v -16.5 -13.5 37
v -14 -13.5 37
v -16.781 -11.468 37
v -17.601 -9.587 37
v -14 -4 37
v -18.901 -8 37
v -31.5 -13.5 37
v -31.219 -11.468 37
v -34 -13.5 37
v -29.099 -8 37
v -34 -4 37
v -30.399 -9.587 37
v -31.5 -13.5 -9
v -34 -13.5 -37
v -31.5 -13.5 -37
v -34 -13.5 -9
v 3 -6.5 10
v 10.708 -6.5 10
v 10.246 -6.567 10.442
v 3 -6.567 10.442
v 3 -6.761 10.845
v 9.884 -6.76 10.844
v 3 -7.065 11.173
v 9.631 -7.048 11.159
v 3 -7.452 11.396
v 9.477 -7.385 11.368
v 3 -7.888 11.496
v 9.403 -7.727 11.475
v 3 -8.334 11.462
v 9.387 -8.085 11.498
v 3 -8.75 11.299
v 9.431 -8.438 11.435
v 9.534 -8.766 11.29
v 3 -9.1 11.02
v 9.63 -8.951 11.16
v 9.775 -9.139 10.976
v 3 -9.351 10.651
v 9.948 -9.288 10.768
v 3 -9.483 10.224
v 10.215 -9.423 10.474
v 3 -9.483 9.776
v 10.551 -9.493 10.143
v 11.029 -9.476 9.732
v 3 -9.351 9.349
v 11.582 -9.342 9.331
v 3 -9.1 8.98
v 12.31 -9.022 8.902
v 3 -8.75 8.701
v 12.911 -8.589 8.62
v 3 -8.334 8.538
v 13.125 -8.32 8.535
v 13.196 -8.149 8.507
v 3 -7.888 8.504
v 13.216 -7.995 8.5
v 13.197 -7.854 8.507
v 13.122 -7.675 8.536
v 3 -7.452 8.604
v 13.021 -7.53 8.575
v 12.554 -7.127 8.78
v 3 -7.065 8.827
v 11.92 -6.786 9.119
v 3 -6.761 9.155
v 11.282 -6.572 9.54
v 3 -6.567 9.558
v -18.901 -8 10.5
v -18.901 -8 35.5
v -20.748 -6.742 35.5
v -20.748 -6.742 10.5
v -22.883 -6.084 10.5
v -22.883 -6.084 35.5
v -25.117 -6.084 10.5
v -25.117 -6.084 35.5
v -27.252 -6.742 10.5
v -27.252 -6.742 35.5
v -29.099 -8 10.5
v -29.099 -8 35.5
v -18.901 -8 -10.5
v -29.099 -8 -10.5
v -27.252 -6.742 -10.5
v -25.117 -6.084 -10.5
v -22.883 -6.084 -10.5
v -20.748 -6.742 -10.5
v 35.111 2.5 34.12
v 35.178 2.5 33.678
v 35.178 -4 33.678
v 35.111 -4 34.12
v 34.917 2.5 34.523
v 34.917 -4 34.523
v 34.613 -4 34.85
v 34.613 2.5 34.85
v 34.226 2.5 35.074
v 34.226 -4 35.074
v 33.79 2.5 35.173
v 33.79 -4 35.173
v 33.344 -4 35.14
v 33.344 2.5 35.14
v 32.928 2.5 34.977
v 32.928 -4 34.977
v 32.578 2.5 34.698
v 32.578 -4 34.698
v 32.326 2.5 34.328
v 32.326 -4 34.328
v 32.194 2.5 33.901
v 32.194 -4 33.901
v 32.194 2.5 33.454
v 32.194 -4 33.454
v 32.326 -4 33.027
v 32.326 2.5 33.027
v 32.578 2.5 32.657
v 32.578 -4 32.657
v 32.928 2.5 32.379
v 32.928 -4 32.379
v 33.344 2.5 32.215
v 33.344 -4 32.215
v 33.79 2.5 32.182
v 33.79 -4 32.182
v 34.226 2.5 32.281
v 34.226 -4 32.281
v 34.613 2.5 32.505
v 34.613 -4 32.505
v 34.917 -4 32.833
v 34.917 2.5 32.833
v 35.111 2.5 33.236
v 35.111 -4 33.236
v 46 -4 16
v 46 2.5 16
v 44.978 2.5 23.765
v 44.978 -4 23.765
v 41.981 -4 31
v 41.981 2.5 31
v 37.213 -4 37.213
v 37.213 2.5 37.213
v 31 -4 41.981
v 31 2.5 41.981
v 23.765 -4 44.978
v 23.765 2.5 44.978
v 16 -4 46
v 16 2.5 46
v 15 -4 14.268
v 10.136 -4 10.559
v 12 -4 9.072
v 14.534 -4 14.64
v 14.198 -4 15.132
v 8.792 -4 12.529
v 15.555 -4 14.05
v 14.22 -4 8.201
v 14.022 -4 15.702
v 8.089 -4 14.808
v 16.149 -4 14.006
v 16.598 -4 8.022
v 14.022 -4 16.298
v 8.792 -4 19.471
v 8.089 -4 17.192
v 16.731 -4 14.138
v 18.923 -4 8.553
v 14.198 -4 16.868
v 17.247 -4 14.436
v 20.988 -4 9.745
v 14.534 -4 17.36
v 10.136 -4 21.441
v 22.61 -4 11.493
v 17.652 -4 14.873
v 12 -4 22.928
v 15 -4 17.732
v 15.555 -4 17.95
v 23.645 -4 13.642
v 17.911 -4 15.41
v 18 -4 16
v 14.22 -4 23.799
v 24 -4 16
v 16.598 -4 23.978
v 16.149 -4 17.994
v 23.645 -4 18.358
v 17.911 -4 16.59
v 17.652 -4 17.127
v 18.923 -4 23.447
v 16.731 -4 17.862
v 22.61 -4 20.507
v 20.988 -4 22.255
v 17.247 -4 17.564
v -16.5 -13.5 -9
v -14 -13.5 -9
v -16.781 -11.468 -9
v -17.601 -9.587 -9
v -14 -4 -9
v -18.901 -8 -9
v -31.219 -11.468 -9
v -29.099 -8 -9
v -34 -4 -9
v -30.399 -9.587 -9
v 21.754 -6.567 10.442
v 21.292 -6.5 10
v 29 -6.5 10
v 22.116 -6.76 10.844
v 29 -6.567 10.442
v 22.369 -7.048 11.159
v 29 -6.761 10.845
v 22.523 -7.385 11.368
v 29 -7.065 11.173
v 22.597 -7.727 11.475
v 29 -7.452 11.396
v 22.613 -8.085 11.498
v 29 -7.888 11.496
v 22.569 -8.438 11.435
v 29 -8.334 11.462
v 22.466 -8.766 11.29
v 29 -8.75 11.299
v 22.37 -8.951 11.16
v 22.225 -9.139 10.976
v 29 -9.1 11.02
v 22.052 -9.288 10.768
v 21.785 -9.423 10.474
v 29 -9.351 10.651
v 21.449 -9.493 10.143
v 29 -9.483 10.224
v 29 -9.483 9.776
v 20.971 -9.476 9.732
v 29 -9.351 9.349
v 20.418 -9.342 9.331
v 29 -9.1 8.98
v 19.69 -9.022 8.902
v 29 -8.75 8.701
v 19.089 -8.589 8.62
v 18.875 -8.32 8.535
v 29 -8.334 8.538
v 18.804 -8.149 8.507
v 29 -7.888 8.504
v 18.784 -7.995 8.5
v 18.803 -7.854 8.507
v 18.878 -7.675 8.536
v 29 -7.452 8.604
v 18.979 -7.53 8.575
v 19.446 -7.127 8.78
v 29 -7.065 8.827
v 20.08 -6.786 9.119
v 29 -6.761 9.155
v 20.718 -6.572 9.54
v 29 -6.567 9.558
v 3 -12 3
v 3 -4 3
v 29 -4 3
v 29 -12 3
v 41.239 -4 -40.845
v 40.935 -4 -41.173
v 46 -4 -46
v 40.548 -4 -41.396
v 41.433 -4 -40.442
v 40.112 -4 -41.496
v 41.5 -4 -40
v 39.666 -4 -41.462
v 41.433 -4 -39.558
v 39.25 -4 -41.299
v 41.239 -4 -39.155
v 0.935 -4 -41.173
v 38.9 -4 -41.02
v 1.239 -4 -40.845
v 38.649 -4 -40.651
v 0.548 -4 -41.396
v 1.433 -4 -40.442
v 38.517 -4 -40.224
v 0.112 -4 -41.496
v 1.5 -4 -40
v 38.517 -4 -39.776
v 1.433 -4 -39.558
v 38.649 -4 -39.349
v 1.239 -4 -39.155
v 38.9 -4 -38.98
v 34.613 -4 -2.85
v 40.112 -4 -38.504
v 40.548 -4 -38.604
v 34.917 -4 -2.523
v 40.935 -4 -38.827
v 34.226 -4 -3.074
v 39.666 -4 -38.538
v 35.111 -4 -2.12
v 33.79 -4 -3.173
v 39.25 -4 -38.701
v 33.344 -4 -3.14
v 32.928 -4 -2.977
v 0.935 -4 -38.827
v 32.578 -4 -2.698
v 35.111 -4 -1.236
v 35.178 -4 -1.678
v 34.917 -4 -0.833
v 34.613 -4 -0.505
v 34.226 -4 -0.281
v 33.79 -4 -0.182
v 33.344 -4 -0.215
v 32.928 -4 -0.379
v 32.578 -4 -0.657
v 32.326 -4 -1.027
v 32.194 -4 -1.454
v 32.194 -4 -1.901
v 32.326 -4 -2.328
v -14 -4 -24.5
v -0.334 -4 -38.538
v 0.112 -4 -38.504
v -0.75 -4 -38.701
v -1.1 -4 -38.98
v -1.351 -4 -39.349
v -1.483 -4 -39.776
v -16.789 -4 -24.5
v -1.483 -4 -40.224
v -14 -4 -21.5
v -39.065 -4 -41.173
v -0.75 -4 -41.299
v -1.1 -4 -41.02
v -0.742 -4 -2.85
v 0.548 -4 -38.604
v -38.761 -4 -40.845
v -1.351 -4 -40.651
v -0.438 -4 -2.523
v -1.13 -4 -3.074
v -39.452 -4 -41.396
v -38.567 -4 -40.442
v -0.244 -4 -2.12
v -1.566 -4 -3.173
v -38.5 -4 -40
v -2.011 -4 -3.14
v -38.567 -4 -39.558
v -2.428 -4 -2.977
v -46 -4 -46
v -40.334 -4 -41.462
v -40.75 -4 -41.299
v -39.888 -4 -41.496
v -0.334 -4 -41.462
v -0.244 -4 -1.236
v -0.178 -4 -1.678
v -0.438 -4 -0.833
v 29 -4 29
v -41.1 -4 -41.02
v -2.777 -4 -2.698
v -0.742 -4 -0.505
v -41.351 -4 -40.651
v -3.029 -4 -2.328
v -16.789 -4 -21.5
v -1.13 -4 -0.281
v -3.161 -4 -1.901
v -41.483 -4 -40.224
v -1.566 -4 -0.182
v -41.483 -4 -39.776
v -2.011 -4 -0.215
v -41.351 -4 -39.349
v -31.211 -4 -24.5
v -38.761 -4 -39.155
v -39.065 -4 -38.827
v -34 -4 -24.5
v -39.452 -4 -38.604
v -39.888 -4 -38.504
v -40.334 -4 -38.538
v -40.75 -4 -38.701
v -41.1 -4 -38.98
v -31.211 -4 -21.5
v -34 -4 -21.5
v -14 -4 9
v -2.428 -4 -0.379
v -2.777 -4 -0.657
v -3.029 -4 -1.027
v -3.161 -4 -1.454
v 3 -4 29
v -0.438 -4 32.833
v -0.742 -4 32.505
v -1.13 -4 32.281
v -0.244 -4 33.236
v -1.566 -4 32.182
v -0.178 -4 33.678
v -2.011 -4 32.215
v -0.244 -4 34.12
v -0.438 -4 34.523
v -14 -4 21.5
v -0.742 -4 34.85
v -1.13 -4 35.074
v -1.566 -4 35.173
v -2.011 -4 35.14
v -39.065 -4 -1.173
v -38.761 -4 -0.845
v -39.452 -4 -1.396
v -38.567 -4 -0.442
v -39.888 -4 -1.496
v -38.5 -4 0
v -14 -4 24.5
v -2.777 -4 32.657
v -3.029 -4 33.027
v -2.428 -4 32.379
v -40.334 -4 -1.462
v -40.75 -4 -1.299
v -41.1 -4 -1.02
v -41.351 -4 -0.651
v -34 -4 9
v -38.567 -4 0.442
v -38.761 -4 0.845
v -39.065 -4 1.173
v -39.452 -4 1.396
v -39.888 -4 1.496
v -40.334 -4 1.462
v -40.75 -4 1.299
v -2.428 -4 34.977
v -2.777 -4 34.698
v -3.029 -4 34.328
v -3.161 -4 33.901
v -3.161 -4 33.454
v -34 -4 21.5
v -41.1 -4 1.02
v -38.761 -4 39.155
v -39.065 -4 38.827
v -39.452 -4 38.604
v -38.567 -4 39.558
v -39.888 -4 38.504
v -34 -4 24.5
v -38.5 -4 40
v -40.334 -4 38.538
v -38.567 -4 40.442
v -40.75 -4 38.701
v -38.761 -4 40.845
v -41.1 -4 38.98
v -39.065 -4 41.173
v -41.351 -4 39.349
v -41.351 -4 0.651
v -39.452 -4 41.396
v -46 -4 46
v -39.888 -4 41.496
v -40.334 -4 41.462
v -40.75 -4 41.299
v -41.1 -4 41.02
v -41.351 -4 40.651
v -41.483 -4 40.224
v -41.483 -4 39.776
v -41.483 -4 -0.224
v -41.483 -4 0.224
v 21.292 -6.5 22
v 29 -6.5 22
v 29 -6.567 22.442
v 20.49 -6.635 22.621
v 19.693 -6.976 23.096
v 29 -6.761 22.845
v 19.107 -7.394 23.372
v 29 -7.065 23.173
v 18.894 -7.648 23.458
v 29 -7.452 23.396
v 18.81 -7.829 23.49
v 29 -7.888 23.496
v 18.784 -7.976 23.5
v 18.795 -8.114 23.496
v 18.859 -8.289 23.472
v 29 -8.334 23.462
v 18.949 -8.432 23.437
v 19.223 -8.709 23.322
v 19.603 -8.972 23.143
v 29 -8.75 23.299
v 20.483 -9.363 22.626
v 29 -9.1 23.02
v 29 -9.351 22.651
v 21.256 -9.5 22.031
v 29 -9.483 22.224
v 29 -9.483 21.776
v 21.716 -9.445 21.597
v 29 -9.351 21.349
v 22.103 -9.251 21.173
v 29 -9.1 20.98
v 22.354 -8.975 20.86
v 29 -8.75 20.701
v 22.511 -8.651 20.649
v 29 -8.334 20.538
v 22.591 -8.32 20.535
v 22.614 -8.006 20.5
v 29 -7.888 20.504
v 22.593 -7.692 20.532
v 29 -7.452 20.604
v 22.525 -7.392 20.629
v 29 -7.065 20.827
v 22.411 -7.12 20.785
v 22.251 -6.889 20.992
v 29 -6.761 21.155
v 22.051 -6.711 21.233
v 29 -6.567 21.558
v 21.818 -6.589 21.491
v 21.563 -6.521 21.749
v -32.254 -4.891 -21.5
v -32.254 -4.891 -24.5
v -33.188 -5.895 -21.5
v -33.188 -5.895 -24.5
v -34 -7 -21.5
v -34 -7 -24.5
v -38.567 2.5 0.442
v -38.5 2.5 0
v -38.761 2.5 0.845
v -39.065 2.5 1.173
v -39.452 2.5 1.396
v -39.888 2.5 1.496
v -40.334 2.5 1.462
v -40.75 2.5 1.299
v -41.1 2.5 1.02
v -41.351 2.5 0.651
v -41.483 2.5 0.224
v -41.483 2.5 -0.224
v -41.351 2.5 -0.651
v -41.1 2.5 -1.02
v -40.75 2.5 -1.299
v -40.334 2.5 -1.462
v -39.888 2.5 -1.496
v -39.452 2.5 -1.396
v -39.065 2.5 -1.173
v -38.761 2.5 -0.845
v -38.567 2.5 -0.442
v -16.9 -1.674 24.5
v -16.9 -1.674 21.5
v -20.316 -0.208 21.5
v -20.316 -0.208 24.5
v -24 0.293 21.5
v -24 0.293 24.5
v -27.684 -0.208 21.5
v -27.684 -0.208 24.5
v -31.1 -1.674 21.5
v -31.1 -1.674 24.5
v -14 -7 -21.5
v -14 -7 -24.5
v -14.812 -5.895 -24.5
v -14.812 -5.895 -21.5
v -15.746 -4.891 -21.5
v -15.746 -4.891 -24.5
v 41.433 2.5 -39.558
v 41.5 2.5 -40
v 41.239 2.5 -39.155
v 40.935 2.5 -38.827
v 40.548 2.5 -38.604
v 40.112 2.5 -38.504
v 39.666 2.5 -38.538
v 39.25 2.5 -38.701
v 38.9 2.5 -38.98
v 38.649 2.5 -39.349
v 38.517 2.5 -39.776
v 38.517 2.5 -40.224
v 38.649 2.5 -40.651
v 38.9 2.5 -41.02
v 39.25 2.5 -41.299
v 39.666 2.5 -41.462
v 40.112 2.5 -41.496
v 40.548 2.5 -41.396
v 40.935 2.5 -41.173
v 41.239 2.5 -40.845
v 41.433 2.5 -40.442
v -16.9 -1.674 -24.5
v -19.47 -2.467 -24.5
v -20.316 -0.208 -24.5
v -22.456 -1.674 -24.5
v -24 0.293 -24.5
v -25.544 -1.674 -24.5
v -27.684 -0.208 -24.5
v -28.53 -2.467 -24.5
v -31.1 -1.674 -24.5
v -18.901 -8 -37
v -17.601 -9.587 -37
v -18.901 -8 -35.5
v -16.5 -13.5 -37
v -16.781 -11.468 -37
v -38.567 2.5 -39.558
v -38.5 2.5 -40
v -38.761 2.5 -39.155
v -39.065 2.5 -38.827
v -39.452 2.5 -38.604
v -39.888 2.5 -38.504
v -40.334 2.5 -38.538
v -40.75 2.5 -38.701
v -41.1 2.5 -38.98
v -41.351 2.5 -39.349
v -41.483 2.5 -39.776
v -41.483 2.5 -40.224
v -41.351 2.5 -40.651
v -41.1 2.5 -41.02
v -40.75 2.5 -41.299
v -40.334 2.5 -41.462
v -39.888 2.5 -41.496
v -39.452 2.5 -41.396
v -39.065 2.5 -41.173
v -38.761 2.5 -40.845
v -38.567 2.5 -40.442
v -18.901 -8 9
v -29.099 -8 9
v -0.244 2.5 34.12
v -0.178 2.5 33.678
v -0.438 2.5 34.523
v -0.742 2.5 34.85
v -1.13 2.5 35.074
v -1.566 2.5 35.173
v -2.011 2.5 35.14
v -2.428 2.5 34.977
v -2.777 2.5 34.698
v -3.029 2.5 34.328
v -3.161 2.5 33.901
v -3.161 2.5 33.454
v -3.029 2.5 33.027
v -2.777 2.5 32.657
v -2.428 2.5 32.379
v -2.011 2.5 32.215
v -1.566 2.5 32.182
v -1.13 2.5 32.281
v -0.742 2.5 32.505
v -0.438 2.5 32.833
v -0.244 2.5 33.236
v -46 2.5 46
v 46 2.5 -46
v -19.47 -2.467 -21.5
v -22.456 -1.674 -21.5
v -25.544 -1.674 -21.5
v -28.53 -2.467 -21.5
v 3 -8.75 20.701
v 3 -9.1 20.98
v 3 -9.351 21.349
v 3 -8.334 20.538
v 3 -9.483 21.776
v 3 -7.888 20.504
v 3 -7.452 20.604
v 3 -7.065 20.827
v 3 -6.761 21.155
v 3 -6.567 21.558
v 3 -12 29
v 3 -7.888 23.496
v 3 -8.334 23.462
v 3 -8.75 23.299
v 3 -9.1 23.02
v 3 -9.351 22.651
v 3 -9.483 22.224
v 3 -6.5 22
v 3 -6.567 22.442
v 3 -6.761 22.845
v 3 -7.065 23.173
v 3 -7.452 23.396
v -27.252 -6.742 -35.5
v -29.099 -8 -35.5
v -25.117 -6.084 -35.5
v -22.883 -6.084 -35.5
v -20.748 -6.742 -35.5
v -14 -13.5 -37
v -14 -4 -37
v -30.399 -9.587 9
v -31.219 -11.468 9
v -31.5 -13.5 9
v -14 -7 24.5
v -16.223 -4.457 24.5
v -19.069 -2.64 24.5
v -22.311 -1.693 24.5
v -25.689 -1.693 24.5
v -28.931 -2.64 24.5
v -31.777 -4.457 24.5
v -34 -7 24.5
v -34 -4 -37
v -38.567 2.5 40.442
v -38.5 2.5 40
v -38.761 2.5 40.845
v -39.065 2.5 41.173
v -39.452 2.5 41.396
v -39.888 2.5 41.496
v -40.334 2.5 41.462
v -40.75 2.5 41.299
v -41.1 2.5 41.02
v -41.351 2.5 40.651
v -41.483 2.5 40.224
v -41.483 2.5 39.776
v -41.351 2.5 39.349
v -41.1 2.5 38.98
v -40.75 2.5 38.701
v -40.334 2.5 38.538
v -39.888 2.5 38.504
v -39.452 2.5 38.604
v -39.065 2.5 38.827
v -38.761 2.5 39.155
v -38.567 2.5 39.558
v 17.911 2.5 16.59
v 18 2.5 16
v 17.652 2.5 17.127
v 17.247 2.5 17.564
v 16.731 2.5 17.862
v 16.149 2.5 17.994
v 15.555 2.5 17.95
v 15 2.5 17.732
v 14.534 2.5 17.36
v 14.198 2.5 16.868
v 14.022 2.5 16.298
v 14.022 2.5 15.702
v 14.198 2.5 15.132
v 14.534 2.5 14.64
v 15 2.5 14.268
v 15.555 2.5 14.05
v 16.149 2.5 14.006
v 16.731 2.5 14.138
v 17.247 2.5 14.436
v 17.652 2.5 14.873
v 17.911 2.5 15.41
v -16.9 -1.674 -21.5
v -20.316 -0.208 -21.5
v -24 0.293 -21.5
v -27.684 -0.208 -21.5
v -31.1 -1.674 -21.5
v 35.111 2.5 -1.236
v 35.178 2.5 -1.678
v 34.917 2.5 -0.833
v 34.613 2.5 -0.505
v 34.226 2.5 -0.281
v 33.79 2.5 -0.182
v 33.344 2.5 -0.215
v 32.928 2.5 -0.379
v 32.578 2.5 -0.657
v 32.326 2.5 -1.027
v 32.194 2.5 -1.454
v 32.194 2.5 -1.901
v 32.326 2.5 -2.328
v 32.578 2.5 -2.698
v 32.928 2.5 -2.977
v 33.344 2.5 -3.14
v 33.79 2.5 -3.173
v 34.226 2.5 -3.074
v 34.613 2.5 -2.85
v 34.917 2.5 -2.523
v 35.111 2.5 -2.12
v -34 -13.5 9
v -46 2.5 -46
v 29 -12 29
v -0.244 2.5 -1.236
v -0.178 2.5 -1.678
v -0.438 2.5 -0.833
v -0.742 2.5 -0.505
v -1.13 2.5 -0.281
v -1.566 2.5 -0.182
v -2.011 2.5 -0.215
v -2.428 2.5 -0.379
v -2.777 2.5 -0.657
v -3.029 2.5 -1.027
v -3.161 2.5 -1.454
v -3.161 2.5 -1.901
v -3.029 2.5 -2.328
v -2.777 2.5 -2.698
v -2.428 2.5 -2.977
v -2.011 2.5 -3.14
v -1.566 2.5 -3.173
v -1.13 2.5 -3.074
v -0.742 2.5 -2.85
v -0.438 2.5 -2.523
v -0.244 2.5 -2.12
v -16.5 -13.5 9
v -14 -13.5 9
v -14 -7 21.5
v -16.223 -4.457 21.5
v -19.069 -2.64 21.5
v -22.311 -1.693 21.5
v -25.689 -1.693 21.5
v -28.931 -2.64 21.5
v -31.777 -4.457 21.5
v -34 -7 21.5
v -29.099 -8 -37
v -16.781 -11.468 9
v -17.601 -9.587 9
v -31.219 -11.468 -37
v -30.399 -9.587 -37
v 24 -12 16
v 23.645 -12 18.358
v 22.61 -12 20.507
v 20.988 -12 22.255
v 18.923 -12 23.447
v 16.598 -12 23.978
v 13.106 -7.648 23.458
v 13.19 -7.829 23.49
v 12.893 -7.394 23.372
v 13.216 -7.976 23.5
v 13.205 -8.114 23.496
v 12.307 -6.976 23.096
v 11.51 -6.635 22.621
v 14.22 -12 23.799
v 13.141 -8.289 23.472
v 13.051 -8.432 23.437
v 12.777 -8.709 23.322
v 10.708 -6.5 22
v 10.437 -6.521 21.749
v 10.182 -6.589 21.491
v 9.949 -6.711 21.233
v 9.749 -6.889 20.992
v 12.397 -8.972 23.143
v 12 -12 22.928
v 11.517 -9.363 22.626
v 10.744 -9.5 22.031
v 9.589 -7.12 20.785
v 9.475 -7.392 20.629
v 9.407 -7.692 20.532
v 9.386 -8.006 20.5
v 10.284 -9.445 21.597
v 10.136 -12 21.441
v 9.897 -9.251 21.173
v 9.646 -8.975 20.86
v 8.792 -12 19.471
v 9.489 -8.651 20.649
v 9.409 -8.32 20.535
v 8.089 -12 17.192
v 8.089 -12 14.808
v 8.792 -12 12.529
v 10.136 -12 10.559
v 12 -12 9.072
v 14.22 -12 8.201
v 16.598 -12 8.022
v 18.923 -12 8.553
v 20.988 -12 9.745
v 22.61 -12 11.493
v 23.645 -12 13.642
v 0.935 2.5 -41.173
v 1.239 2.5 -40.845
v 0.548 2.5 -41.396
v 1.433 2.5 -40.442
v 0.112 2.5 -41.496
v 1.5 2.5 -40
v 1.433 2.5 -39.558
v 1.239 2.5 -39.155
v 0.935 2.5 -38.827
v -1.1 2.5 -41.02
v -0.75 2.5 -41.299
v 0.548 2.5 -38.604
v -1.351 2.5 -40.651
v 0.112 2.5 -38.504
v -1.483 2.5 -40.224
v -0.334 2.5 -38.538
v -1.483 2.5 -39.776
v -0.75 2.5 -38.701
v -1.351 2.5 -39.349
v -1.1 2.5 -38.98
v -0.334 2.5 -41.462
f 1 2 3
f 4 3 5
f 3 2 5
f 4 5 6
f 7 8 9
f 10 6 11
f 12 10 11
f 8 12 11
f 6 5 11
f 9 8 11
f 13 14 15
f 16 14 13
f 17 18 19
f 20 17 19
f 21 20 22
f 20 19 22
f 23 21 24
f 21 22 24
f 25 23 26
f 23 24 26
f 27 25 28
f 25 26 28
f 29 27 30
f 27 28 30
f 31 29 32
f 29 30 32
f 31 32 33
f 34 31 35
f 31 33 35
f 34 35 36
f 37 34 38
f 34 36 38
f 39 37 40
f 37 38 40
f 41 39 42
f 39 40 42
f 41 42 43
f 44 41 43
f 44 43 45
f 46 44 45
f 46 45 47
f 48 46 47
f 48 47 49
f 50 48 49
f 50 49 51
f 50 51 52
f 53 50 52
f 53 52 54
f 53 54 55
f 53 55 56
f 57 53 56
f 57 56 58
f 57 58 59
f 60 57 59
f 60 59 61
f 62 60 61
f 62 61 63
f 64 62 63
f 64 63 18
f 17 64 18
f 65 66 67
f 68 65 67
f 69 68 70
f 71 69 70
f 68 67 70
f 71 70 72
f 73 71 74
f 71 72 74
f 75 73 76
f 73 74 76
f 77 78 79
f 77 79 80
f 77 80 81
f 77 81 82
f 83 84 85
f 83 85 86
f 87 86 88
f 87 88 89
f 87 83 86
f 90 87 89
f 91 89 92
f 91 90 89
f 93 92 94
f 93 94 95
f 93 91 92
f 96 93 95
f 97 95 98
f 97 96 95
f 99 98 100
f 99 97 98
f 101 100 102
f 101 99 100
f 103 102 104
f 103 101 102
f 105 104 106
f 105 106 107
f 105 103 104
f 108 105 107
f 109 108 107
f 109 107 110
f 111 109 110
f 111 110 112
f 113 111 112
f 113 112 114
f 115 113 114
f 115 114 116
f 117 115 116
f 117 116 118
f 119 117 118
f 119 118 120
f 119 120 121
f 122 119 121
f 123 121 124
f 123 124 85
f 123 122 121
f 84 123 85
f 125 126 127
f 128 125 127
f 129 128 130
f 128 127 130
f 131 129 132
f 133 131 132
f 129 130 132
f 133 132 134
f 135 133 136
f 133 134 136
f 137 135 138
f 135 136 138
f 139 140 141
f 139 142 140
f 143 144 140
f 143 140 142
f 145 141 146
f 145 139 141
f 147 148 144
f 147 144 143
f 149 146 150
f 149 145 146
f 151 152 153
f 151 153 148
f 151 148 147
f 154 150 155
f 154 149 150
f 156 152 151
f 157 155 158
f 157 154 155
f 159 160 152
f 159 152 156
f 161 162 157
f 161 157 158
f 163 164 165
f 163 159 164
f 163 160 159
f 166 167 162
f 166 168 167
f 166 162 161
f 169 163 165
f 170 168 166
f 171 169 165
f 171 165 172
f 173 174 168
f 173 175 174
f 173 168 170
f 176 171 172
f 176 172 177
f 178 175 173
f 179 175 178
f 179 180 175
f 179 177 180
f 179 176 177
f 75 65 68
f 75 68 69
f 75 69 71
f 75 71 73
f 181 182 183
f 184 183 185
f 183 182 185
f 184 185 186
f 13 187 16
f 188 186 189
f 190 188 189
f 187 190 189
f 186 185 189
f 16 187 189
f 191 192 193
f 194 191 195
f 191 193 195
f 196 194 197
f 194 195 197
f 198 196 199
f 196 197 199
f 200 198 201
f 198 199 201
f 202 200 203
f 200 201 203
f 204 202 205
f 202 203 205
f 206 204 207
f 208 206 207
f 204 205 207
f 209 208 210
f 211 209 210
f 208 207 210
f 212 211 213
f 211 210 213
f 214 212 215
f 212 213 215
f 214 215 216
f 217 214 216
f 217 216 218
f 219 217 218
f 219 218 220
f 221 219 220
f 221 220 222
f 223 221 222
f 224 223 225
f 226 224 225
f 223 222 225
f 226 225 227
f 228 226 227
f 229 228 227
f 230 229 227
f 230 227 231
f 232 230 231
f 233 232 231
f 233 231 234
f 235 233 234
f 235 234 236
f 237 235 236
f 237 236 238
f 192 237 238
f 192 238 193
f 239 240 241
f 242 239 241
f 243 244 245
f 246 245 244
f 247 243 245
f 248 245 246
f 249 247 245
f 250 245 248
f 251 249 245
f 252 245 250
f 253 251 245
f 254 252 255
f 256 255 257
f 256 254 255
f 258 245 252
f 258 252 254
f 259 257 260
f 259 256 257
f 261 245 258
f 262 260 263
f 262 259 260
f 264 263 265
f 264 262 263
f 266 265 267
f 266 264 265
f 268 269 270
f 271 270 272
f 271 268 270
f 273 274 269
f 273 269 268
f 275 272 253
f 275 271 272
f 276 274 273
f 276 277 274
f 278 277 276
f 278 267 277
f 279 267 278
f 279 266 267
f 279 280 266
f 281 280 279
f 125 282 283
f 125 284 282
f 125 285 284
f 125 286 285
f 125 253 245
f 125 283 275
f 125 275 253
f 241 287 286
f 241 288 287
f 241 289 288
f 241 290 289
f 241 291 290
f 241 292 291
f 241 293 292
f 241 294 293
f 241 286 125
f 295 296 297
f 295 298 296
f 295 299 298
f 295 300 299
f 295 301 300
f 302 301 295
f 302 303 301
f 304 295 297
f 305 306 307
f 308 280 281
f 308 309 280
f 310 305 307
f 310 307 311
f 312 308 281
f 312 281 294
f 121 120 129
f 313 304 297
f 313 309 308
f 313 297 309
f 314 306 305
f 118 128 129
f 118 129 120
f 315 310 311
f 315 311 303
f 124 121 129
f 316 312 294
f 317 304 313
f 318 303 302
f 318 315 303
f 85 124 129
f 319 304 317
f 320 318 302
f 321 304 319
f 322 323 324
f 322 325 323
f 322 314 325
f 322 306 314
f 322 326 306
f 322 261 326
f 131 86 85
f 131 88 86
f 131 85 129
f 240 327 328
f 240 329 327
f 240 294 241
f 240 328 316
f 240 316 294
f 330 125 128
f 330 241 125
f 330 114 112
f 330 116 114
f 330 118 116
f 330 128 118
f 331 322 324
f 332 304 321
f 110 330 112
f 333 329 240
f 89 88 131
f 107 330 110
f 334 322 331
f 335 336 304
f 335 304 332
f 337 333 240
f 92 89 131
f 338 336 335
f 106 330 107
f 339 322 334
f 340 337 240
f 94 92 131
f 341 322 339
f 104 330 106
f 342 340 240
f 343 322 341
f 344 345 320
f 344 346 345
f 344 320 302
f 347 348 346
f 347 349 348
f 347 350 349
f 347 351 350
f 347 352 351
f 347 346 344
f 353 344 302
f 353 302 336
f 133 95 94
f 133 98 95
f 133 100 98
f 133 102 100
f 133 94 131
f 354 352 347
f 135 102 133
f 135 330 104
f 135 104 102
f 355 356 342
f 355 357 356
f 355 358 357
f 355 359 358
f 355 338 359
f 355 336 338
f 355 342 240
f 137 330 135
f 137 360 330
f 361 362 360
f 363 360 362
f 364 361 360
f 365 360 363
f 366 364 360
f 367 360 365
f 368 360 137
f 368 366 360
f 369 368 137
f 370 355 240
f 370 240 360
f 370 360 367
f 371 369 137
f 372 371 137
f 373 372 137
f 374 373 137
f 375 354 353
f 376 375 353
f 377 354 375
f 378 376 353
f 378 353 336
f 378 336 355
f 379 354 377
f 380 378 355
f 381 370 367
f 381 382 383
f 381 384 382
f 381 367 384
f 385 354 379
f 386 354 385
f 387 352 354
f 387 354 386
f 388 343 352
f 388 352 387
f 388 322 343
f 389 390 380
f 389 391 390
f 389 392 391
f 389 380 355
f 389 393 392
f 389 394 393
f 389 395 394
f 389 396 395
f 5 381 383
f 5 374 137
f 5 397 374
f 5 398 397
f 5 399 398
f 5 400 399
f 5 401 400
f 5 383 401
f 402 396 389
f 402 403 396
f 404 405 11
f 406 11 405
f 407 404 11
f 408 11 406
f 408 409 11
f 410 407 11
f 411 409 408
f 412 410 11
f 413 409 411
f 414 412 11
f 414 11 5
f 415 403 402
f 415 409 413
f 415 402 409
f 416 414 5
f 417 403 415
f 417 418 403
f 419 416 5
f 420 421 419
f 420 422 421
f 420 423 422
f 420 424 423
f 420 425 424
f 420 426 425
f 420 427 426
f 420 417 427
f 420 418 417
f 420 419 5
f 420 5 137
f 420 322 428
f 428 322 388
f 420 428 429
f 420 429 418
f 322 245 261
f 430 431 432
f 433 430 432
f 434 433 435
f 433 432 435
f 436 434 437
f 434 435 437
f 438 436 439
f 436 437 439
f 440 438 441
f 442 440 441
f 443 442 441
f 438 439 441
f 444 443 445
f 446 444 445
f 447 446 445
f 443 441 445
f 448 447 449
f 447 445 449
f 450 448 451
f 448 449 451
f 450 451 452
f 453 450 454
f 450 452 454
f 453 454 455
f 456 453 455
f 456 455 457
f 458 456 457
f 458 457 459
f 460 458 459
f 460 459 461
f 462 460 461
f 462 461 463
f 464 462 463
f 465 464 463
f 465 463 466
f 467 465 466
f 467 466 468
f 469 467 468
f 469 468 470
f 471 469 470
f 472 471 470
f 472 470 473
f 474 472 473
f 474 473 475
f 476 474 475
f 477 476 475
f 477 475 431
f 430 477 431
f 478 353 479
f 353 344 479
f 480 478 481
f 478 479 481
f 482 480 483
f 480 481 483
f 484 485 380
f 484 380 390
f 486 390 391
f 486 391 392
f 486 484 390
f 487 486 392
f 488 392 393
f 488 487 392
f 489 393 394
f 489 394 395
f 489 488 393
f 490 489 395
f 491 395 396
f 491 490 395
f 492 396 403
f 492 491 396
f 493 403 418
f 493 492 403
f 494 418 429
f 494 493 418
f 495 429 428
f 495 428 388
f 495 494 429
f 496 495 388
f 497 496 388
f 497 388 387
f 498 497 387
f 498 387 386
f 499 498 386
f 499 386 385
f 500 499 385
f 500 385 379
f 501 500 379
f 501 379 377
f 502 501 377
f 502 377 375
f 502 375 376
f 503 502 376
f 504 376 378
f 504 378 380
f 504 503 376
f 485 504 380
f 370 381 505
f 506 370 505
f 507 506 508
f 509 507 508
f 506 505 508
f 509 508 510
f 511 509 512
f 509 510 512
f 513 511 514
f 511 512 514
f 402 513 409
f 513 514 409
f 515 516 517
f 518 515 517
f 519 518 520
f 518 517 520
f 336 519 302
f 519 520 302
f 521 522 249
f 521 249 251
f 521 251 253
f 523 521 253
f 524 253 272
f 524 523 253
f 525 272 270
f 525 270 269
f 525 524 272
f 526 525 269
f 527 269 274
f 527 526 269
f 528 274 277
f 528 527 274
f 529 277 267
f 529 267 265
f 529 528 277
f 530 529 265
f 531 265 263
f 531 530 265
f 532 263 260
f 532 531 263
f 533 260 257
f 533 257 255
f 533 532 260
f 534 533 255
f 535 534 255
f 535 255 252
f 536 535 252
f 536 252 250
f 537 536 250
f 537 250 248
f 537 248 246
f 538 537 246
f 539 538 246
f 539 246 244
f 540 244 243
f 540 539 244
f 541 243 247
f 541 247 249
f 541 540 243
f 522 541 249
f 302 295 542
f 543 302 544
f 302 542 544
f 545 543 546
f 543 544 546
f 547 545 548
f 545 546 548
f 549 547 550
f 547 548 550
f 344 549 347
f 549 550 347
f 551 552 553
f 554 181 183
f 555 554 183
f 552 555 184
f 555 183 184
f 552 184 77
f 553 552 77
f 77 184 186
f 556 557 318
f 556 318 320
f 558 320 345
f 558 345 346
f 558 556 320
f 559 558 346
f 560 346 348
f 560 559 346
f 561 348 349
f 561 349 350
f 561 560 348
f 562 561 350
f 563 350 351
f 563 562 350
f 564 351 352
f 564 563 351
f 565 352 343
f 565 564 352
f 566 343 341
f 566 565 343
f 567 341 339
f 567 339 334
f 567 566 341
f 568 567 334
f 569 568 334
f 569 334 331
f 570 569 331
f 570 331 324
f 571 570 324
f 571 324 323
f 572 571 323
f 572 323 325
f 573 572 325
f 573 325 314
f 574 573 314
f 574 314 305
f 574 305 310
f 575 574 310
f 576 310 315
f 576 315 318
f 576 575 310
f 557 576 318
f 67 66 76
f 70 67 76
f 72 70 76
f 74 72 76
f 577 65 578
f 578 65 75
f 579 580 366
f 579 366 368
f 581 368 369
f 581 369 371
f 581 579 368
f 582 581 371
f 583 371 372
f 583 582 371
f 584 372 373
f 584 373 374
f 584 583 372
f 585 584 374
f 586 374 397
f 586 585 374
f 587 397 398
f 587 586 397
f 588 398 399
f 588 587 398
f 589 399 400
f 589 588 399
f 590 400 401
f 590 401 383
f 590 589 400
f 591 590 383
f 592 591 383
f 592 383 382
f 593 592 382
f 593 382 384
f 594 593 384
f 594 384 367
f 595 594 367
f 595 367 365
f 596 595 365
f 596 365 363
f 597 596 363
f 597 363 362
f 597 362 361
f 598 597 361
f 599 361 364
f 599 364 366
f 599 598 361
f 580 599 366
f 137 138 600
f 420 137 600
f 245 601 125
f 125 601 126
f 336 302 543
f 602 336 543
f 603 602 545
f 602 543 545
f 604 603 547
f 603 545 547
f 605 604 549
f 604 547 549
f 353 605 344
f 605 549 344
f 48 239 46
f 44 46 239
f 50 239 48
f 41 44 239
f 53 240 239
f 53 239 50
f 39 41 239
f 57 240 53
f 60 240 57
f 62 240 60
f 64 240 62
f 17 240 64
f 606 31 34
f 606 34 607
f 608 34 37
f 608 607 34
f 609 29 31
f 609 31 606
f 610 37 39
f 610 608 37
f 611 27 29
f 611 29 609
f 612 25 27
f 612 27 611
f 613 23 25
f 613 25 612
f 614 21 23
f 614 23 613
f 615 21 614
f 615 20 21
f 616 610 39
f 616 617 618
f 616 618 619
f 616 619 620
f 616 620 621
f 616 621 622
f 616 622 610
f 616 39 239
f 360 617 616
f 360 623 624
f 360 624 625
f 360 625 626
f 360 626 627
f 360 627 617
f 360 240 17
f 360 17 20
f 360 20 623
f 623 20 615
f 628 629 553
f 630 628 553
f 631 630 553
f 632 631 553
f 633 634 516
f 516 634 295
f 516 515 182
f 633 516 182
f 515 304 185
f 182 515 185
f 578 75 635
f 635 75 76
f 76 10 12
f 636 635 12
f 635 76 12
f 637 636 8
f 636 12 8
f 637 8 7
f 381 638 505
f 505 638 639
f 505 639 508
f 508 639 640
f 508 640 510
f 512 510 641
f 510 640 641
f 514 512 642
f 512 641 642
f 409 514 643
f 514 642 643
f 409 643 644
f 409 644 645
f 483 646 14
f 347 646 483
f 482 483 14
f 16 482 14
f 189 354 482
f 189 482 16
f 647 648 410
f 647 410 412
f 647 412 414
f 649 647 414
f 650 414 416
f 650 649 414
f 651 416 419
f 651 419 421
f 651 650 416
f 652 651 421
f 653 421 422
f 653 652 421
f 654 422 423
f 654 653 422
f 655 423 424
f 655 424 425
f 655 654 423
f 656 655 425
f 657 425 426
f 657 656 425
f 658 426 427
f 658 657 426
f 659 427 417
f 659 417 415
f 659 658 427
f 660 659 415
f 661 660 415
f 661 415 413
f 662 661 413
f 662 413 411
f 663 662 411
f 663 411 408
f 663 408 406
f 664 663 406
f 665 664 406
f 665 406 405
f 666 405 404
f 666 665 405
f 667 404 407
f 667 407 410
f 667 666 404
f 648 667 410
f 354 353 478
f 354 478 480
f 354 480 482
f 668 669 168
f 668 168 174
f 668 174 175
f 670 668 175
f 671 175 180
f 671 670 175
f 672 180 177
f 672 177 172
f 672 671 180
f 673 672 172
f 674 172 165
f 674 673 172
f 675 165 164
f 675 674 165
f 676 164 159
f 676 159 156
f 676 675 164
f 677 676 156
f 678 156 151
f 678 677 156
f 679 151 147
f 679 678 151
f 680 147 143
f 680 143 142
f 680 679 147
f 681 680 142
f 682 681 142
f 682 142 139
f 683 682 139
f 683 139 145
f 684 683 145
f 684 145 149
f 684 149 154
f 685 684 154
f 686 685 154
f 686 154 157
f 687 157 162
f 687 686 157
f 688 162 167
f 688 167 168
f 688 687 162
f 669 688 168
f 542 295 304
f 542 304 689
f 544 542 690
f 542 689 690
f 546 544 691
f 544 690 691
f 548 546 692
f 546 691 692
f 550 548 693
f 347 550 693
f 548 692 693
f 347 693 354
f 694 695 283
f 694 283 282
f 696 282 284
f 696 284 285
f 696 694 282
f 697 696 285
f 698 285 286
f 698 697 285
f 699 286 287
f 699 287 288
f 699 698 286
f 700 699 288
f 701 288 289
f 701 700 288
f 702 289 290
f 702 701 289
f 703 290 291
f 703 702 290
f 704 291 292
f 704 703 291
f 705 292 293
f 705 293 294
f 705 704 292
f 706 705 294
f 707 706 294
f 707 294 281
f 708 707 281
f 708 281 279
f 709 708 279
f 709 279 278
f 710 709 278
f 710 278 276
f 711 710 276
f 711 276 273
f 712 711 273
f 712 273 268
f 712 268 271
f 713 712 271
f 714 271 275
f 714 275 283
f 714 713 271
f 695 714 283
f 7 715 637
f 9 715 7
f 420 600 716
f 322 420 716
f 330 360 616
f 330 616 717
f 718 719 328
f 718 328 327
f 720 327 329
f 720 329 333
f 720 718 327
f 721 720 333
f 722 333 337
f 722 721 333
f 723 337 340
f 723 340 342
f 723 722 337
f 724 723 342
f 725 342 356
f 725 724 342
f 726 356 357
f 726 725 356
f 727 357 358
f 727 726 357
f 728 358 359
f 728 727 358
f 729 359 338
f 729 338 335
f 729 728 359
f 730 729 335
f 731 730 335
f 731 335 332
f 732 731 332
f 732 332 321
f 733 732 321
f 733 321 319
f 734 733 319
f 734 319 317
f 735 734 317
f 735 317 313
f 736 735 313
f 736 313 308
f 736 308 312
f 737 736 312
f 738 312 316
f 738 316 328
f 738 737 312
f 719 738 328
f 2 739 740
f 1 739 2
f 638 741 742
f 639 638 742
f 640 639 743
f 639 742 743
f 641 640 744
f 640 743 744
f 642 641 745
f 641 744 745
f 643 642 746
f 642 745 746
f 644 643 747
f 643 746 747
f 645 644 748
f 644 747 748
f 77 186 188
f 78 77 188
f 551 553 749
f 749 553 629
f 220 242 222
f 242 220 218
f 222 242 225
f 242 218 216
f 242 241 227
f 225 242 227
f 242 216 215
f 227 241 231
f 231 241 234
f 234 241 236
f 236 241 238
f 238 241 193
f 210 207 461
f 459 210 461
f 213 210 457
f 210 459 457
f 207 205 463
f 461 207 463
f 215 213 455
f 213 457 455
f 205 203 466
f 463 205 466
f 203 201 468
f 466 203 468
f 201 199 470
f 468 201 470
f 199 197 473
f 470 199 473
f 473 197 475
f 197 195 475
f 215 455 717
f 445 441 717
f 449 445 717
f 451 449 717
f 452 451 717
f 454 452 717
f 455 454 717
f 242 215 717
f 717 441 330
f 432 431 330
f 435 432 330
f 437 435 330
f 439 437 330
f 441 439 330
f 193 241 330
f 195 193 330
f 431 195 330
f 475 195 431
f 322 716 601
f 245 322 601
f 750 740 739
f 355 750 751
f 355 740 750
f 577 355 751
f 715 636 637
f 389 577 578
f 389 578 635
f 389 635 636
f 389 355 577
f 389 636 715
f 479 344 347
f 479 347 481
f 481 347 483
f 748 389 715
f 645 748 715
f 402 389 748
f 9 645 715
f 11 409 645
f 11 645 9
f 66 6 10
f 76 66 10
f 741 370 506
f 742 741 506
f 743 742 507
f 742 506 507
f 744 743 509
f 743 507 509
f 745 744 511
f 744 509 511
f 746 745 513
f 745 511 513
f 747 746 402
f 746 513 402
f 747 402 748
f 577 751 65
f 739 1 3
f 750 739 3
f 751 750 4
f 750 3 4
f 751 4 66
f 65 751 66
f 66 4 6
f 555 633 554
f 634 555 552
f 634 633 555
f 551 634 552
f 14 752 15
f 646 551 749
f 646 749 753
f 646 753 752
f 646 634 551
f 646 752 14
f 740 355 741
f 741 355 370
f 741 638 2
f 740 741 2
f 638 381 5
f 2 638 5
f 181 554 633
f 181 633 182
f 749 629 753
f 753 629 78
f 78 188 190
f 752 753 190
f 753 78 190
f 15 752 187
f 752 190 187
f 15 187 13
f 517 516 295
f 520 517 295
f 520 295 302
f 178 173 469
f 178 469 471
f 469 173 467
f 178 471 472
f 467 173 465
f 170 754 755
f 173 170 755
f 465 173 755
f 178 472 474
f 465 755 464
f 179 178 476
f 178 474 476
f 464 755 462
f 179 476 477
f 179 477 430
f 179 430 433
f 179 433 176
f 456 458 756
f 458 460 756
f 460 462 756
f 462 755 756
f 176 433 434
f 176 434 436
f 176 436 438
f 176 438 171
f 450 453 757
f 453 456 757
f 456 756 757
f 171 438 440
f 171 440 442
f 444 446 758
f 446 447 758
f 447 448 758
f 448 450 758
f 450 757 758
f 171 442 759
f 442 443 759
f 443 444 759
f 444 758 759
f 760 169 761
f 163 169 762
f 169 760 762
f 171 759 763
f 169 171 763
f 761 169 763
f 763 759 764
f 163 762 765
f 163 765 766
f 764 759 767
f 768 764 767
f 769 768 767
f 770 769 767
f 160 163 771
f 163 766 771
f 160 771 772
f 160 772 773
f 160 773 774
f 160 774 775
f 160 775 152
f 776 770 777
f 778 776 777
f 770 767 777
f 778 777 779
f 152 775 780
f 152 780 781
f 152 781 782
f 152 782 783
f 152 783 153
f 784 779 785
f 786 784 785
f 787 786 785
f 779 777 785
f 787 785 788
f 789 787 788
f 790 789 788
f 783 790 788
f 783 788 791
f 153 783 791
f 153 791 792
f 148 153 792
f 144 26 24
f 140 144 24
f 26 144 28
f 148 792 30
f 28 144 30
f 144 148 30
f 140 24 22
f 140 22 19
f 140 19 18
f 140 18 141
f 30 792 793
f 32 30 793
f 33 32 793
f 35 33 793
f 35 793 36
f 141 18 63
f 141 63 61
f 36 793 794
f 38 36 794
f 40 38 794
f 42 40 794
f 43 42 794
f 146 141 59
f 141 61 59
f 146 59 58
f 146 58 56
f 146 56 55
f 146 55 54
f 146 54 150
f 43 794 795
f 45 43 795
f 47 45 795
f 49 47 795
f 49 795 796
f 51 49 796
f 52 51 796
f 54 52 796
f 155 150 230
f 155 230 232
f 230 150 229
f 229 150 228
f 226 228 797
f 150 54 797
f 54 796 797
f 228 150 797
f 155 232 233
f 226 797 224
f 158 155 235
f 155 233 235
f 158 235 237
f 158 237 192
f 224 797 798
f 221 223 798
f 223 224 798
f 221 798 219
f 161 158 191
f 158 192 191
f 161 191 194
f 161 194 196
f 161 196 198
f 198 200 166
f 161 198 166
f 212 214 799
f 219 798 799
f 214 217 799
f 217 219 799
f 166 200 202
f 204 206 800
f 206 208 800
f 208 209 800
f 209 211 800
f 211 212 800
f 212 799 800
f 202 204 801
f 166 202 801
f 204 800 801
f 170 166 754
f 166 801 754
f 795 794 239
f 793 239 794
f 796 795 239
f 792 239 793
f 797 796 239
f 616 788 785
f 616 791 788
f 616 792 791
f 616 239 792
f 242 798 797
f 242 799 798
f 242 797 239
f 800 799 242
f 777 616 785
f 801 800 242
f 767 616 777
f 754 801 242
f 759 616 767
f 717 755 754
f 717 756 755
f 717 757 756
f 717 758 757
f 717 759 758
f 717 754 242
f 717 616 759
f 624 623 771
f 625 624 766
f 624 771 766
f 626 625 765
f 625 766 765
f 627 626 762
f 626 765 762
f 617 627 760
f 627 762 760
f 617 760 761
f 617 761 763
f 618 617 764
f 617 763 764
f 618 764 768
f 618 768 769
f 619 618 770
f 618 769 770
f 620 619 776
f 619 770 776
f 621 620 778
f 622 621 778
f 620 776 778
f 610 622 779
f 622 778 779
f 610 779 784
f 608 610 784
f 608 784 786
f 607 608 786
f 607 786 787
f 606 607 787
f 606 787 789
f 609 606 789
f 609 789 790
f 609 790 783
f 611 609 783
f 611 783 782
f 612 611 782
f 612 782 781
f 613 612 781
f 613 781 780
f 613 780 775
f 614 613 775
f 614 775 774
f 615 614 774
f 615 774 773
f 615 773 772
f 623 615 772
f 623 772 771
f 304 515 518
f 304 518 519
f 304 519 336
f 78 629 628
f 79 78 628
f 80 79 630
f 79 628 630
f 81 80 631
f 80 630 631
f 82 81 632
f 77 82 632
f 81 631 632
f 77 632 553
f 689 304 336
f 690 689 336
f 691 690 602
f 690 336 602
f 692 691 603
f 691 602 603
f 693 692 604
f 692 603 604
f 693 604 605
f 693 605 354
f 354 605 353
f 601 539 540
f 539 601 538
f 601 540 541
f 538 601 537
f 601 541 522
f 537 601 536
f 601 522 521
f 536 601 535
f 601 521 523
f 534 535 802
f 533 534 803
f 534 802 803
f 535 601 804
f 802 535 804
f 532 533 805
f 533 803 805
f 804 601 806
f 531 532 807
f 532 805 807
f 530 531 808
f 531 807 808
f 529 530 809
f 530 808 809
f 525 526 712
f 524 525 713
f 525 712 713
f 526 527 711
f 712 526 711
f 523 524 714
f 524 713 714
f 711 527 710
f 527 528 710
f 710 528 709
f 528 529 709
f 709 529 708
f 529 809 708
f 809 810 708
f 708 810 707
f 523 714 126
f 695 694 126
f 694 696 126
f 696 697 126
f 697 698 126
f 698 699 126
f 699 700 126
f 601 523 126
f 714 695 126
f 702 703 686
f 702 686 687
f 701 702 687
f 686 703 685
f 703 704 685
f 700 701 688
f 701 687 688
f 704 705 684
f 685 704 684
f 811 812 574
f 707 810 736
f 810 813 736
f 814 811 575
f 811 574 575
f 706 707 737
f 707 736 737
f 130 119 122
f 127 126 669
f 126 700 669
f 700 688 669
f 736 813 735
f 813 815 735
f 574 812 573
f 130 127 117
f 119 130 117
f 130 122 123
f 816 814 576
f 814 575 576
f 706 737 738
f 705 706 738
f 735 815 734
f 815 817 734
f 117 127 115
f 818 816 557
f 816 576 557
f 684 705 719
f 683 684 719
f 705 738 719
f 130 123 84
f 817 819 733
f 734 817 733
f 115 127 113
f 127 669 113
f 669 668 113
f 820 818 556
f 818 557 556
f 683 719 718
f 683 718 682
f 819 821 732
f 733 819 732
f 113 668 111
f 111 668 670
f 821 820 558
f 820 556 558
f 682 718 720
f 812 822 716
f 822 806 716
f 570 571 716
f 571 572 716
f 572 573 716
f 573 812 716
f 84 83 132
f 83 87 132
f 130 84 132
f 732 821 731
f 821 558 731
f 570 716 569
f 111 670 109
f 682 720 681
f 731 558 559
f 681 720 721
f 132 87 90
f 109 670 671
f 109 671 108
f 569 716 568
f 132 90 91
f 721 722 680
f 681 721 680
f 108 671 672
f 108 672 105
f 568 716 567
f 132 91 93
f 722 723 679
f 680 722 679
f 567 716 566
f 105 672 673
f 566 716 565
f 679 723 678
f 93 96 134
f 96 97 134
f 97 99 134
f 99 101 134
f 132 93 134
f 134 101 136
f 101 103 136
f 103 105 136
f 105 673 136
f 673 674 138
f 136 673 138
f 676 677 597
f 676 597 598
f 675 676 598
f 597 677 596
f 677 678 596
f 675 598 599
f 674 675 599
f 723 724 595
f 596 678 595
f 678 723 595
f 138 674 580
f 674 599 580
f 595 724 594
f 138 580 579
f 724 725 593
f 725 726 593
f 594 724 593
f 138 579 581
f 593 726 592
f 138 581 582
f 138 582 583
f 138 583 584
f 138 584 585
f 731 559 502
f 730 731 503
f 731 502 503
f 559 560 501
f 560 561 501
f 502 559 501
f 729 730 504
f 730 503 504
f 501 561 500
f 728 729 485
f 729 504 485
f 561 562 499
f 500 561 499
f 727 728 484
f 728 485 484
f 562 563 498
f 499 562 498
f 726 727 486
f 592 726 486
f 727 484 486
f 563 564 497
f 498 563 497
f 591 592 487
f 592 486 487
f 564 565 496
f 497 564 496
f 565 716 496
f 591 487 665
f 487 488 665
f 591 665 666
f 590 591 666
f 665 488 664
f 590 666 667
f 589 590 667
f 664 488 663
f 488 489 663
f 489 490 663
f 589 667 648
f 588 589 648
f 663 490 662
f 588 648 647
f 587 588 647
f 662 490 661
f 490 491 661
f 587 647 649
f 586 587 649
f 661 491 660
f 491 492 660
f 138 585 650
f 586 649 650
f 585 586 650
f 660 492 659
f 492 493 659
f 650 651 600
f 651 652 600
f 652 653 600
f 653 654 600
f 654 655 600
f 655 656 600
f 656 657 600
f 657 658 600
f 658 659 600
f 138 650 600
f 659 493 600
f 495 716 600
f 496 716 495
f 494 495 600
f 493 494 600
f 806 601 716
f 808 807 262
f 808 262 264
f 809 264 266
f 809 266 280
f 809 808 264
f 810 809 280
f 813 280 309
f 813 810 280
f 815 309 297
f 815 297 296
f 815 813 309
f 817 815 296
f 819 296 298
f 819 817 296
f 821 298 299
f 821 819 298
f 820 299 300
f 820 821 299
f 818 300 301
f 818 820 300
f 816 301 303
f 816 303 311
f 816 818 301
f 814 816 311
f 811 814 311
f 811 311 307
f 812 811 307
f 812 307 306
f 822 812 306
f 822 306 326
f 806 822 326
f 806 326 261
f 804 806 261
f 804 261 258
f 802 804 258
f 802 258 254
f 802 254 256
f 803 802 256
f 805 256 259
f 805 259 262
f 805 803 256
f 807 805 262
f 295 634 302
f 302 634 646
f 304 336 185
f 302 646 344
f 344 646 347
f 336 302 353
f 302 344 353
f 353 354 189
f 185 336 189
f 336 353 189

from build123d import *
from build123d.topology import SkipClean

# Parameters (mm, degrees)
EXTRUDE2_DEPTH          = 4
EXTRUDE2_DEPTH_BACK     = 2.5
SKETCH7_R               = 1.5
SKETCH7_R_2             = 2
SKETCH8_W               = 28
SKETCH8_H               = 20
EXTRUDE3_DEPTH          = 9.5
EXTRUDE6_DEPTH          = 28
SKETCH15_R              = 7.5
EXTRUDE7_DEPTH          = 25
SKETCH16_W              = 3
SKETCH16_H              = 3
SKETCH8_4_W             = 28
SKETCH8_4_H             = 20
EXTRUDE8_DEPTH          = 9.5
EXTRUDE9_DEPTH          = 28
SKETCH19_R              = 7.5
EXTRUDE10_DEPTH         = 25
SKETCH20_W              = 3
SKETCH20_H              = 3
BODY_MOVE_COPY1_ANGLE   = 180
BODY_MOVE_COPY1_2_ANGLE = 180
SKETCH22_W              = 26
SKETCH22_H              = 26
EXTRUDE11_DEPTH         = 8
SKETCH23_R              = 1.5
EXTRUDE12_DEPTH         = 26
SKETCH24_R              = 8
EXTRUDE13_DEPTH         = 8


with BuildPart() as part:
    # Sketch7 → Extrude2 (new, two sides: drawn at the far end of the back side and taken through both)
    with BuildSketch(Plane(origin=(0, 0, 0), x_dir=(1, 0, 0), z_dir=(0, 1, 0)).offset(-EXTRUDE2_DEPTH_BACK)):
        with BuildLine():
            Line((-46, -46), (16, -46))
            ThreePointArc((16, -46), (37.213203436, -37.213203436), (46, -16))
            Line((46, -16), (46, 46))
            Line((46, 46), (-46, 46))
            Line((-46, 46), (-46, -46))
        make_face()
        with Locations(Location((-1.67766953, 1.67766953, 0), (0, 0, 270))):
            Circle(SKETCH7_R, mode=Mode.SUBTRACT)
        with Locations(Location((-40, 40, 0), (0, 0, 270))):
            Circle(SKETCH7_R, mode=Mode.SUBTRACT)
        with Locations(Location((-40, -40, 0), (0, 0, 270))):
            Circle(SKETCH7_R, mode=Mode.SUBTRACT)
        with Locations(Location((40, 40, 0), (0, 0, 270))):
            Circle(SKETCH7_R, mode=Mode.SUBTRACT)
        with Locations(Location((0, 40, 0), (0, 0, 270))):
            Circle(SKETCH7_R, mode=Mode.SUBTRACT)
        with Locations(Location((-40, 0, 0), (0, 0, 270))):
            Circle(SKETCH7_R, mode=Mode.SUBTRACT)
        with Locations(Location((16, -16, 0), (0, 0, 270))):
            Circle(SKETCH7_R_2, mode=Mode.SUBTRACT)
        with Locations(Location((33.67766953, 1.67766953, 0), (0, 0, 270))):
            Circle(SKETCH7_R, mode=Mode.SUBTRACT)
        with Locations(Location((33.67766953, -33.67766953, 0), (0, 0, 270))):
            Circle(SKETCH7_R, mode=Mode.SUBTRACT)
        with Locations(Location((-1.67766953, -33.67766953, 0), (0, 0, 270))):
            Circle(SKETCH7_R, mode=Mode.SUBTRACT)
    extrude(amount=EXTRUDE2_DEPTH + EXTRUDE2_DEPTH_BACK)


with BuildPart() as body_2:
    # Sketch8 → Extrude3 (new body)
    with BuildSketch(Plane(origin=(0, 4, 0), x_dir=(1, 0, 0), z_dir=(0, 1, 0))):
        with Locations((-23, 24)):
            Rectangle(SKETCH8_W, SKETCH8_H)
    extrude(amount=EXTRUDE3_DEPTH)

    # Sketch10 → Extrude6 (cut)
    with BuildSketch(Plane(origin=(-9, 0, 0), x_dir=(0, 0, -1), z_dir=(1, 0, 0))):
        with BuildLine():
            Line((31.5, 13.5), (24, 13.5))
            Line((24, 13.5), (16.5, 13.5))
            ThreePointArc((16.5, 13.5), (17.126403912, 10.499387259), (18.900980486, 8))
            Line((18.900980486, 8), (29.099019514, 8))
            ThreePointArc((29.099019514, 8), (30.873596088, 10.499387259), (31.5, 13.5))
        make_face()
    extrude(amount=-EXTRUDE6_DEPTH, mode=Mode.SUBTRACT)

    # Sketch15 → Extrude7 (cut)
    with SkipClean():  # the faces are left unmerged after this step: merging them gives an invalid solid
        with BuildSketch(Plane.ZY.offset(35.5)):
            with Locations((-24, 13.5)):
                Circle(SKETCH15_R)
        extrude(amount=-EXTRUDE7_DEPTH, mode=Mode.SUBTRACT)


with BuildPart() as cut_sweep1_tool:
    # Cut-Sweep1: sweep along a path in Sketch17
    with SkipClean():  # the faces are left unmerged after this step: merging them gives an invalid solid
        with BuildLine(Plane(origin=(-23, 0, 0), x_dir=(0, 0, -1), z_dir=(1, 0, 0))) as cut_sweep1_path:
            CenterArc((24, 13.5), 12.806248475, 0, 360)
        # Sketch16 → Cut-Sweep1 (sweep)
        with BuildSketch(Plane.XY.offset(-14)):
            with Locations((-23, 5.5)):
                Rectangle(SKETCH16_W, SKETCH16_H)
        sweep(path=cut_sweep1_path.line)


with BuildPart() as part_1:
    with SkipClean():  # the faces are left unmerged after this step: merging them gives an invalid solid
        add(part.part)

        # Cut-Sweep1: cut by cut_sweep1_tool
        add(cut_sweep1_tool.part, mode=Mode.SUBTRACT)

    # Sketch8<4> → Extrude8 (add)
    with BuildSketch(Plane(origin=(0, 4, 0), x_dir=(1, 0, 0), z_dir=(0, 1, 0))):
        with Locations((23, 24)):
            Rectangle(SKETCH8_4_W, SKETCH8_4_H)
    extrude(amount=EXTRUDE8_DEPTH)

    # Sketch18 → Extrude9 (cut)
    with BuildSketch(Plane(origin=(37, 0, 0), x_dir=(0, 0, -1), z_dir=(1, 0, 0))):
        with BuildLine():
            Line((18.900980486, 8), (29.099019514, 8))
            ThreePointArc((29.099019514, 8), (30.873596088, 10.499387259), (31.5, 13.5))
            Line((31.5, 13.5), (16.5, 13.5))
            ThreePointArc((16.5, 13.5), (17.126403912, 10.499387259), (18.900980486, 8))
        make_face()
    extrude(amount=-EXTRUDE9_DEPTH, mode=Mode.SUBTRACT)

    # Sketch19 → Extrude10 (cut)
    with BuildSketch(Plane(origin=(35.5, 0, 0), x_dir=(0, 0, -1), z_dir=(1, 0, 0))):
        with Locations((24, 13.5)):
            Circle(SKETCH19_R)
    extrude(amount=-EXTRUDE10_DEPTH, mode=Mode.SUBTRACT)

    # Cut-Sweep2: sweep along a path in Sketch21
    with BuildLine(Plane(origin=(23, 0, 0), x_dir=(0, 0, -1), z_dir=(1, 0, 0))) as cut_sweep2_path:
        CenterArc((24, 13.5), 12.806248475, 0, 360)
    # Sketch20 → Cut-Sweep2 (sweep, cut)
    with BuildSketch(Plane.XY.offset(-14)):
        with Locations((23, 5.5)):
            Rectangle(SKETCH20_W, SKETCH20_H)
    sweep(path=cut_sweep2_path.line, mode=Mode.SUBTRACT)


with BuildPart() as body_2_1:
    with SkipClean():  # the faces are left unmerged after this step: merging them gives an invalid solid
        add(body_2.part)

        # Cut-Sweep1: cut by cut_sweep1_tool
        add(cut_sweep1_tool.part, mode=Mode.SUBTRACT)


with BuildPart() as body_2_2:
    # Body-Move/Copy1: read off the stored shape, not the designer's step
    # Body-Move/Copy1: moved
    add(body_2_1.part.rotate(Axis((0, 0, 0), (0.7071067812, 0, 0.7071067812)), BODY_MOVE_COPY1_ANGLE))


with BuildPart() as part_2:
    # Body-Move_Copy1 2: moved
    add(part_1.part.rotate(Axis((0, 0, 0), (0.7071067812, 0, 0.7071067812)), BODY_MOVE_COPY1_2_ANGLE))

    # Sketch22 → Extrude11 (add)
    with BuildSketch(Plane.XZ.offset(4)):
        with Locations((16, 16)):
            Rectangle(SKETCH22_W, SKETCH22_H)
    extrude(amount=EXTRUDE11_DEPTH)

    # Sketch23 → Extrude12 (cut)
    with BuildSketch(Plane(origin=(29, 0, 0), x_dir=(0, 0, -1), z_dir=(1, 0, 0))):
        with Locations(Location((-22, -8, 0), (0, 0, 90))):
            Circle(SKETCH23_R)
        with Locations(Location((-10, -8, 0), (0, 0, 90))):
            Circle(SKETCH23_R)
    extrude(amount=-EXTRUDE12_DEPTH, mode=Mode.SUBTRACT)

    # Sketch24 → Extrude13 (cut)
    with BuildSketch(Plane.XZ.offset(12)):
        with Locations((16, 16)):
            Circle(SKETCH24_R)
    extrude(amount=-EXTRUDE13_DEPTH, mode=Mode.SUBTRACT)


solid = Compound([body_2_2.part, part_2.part])
